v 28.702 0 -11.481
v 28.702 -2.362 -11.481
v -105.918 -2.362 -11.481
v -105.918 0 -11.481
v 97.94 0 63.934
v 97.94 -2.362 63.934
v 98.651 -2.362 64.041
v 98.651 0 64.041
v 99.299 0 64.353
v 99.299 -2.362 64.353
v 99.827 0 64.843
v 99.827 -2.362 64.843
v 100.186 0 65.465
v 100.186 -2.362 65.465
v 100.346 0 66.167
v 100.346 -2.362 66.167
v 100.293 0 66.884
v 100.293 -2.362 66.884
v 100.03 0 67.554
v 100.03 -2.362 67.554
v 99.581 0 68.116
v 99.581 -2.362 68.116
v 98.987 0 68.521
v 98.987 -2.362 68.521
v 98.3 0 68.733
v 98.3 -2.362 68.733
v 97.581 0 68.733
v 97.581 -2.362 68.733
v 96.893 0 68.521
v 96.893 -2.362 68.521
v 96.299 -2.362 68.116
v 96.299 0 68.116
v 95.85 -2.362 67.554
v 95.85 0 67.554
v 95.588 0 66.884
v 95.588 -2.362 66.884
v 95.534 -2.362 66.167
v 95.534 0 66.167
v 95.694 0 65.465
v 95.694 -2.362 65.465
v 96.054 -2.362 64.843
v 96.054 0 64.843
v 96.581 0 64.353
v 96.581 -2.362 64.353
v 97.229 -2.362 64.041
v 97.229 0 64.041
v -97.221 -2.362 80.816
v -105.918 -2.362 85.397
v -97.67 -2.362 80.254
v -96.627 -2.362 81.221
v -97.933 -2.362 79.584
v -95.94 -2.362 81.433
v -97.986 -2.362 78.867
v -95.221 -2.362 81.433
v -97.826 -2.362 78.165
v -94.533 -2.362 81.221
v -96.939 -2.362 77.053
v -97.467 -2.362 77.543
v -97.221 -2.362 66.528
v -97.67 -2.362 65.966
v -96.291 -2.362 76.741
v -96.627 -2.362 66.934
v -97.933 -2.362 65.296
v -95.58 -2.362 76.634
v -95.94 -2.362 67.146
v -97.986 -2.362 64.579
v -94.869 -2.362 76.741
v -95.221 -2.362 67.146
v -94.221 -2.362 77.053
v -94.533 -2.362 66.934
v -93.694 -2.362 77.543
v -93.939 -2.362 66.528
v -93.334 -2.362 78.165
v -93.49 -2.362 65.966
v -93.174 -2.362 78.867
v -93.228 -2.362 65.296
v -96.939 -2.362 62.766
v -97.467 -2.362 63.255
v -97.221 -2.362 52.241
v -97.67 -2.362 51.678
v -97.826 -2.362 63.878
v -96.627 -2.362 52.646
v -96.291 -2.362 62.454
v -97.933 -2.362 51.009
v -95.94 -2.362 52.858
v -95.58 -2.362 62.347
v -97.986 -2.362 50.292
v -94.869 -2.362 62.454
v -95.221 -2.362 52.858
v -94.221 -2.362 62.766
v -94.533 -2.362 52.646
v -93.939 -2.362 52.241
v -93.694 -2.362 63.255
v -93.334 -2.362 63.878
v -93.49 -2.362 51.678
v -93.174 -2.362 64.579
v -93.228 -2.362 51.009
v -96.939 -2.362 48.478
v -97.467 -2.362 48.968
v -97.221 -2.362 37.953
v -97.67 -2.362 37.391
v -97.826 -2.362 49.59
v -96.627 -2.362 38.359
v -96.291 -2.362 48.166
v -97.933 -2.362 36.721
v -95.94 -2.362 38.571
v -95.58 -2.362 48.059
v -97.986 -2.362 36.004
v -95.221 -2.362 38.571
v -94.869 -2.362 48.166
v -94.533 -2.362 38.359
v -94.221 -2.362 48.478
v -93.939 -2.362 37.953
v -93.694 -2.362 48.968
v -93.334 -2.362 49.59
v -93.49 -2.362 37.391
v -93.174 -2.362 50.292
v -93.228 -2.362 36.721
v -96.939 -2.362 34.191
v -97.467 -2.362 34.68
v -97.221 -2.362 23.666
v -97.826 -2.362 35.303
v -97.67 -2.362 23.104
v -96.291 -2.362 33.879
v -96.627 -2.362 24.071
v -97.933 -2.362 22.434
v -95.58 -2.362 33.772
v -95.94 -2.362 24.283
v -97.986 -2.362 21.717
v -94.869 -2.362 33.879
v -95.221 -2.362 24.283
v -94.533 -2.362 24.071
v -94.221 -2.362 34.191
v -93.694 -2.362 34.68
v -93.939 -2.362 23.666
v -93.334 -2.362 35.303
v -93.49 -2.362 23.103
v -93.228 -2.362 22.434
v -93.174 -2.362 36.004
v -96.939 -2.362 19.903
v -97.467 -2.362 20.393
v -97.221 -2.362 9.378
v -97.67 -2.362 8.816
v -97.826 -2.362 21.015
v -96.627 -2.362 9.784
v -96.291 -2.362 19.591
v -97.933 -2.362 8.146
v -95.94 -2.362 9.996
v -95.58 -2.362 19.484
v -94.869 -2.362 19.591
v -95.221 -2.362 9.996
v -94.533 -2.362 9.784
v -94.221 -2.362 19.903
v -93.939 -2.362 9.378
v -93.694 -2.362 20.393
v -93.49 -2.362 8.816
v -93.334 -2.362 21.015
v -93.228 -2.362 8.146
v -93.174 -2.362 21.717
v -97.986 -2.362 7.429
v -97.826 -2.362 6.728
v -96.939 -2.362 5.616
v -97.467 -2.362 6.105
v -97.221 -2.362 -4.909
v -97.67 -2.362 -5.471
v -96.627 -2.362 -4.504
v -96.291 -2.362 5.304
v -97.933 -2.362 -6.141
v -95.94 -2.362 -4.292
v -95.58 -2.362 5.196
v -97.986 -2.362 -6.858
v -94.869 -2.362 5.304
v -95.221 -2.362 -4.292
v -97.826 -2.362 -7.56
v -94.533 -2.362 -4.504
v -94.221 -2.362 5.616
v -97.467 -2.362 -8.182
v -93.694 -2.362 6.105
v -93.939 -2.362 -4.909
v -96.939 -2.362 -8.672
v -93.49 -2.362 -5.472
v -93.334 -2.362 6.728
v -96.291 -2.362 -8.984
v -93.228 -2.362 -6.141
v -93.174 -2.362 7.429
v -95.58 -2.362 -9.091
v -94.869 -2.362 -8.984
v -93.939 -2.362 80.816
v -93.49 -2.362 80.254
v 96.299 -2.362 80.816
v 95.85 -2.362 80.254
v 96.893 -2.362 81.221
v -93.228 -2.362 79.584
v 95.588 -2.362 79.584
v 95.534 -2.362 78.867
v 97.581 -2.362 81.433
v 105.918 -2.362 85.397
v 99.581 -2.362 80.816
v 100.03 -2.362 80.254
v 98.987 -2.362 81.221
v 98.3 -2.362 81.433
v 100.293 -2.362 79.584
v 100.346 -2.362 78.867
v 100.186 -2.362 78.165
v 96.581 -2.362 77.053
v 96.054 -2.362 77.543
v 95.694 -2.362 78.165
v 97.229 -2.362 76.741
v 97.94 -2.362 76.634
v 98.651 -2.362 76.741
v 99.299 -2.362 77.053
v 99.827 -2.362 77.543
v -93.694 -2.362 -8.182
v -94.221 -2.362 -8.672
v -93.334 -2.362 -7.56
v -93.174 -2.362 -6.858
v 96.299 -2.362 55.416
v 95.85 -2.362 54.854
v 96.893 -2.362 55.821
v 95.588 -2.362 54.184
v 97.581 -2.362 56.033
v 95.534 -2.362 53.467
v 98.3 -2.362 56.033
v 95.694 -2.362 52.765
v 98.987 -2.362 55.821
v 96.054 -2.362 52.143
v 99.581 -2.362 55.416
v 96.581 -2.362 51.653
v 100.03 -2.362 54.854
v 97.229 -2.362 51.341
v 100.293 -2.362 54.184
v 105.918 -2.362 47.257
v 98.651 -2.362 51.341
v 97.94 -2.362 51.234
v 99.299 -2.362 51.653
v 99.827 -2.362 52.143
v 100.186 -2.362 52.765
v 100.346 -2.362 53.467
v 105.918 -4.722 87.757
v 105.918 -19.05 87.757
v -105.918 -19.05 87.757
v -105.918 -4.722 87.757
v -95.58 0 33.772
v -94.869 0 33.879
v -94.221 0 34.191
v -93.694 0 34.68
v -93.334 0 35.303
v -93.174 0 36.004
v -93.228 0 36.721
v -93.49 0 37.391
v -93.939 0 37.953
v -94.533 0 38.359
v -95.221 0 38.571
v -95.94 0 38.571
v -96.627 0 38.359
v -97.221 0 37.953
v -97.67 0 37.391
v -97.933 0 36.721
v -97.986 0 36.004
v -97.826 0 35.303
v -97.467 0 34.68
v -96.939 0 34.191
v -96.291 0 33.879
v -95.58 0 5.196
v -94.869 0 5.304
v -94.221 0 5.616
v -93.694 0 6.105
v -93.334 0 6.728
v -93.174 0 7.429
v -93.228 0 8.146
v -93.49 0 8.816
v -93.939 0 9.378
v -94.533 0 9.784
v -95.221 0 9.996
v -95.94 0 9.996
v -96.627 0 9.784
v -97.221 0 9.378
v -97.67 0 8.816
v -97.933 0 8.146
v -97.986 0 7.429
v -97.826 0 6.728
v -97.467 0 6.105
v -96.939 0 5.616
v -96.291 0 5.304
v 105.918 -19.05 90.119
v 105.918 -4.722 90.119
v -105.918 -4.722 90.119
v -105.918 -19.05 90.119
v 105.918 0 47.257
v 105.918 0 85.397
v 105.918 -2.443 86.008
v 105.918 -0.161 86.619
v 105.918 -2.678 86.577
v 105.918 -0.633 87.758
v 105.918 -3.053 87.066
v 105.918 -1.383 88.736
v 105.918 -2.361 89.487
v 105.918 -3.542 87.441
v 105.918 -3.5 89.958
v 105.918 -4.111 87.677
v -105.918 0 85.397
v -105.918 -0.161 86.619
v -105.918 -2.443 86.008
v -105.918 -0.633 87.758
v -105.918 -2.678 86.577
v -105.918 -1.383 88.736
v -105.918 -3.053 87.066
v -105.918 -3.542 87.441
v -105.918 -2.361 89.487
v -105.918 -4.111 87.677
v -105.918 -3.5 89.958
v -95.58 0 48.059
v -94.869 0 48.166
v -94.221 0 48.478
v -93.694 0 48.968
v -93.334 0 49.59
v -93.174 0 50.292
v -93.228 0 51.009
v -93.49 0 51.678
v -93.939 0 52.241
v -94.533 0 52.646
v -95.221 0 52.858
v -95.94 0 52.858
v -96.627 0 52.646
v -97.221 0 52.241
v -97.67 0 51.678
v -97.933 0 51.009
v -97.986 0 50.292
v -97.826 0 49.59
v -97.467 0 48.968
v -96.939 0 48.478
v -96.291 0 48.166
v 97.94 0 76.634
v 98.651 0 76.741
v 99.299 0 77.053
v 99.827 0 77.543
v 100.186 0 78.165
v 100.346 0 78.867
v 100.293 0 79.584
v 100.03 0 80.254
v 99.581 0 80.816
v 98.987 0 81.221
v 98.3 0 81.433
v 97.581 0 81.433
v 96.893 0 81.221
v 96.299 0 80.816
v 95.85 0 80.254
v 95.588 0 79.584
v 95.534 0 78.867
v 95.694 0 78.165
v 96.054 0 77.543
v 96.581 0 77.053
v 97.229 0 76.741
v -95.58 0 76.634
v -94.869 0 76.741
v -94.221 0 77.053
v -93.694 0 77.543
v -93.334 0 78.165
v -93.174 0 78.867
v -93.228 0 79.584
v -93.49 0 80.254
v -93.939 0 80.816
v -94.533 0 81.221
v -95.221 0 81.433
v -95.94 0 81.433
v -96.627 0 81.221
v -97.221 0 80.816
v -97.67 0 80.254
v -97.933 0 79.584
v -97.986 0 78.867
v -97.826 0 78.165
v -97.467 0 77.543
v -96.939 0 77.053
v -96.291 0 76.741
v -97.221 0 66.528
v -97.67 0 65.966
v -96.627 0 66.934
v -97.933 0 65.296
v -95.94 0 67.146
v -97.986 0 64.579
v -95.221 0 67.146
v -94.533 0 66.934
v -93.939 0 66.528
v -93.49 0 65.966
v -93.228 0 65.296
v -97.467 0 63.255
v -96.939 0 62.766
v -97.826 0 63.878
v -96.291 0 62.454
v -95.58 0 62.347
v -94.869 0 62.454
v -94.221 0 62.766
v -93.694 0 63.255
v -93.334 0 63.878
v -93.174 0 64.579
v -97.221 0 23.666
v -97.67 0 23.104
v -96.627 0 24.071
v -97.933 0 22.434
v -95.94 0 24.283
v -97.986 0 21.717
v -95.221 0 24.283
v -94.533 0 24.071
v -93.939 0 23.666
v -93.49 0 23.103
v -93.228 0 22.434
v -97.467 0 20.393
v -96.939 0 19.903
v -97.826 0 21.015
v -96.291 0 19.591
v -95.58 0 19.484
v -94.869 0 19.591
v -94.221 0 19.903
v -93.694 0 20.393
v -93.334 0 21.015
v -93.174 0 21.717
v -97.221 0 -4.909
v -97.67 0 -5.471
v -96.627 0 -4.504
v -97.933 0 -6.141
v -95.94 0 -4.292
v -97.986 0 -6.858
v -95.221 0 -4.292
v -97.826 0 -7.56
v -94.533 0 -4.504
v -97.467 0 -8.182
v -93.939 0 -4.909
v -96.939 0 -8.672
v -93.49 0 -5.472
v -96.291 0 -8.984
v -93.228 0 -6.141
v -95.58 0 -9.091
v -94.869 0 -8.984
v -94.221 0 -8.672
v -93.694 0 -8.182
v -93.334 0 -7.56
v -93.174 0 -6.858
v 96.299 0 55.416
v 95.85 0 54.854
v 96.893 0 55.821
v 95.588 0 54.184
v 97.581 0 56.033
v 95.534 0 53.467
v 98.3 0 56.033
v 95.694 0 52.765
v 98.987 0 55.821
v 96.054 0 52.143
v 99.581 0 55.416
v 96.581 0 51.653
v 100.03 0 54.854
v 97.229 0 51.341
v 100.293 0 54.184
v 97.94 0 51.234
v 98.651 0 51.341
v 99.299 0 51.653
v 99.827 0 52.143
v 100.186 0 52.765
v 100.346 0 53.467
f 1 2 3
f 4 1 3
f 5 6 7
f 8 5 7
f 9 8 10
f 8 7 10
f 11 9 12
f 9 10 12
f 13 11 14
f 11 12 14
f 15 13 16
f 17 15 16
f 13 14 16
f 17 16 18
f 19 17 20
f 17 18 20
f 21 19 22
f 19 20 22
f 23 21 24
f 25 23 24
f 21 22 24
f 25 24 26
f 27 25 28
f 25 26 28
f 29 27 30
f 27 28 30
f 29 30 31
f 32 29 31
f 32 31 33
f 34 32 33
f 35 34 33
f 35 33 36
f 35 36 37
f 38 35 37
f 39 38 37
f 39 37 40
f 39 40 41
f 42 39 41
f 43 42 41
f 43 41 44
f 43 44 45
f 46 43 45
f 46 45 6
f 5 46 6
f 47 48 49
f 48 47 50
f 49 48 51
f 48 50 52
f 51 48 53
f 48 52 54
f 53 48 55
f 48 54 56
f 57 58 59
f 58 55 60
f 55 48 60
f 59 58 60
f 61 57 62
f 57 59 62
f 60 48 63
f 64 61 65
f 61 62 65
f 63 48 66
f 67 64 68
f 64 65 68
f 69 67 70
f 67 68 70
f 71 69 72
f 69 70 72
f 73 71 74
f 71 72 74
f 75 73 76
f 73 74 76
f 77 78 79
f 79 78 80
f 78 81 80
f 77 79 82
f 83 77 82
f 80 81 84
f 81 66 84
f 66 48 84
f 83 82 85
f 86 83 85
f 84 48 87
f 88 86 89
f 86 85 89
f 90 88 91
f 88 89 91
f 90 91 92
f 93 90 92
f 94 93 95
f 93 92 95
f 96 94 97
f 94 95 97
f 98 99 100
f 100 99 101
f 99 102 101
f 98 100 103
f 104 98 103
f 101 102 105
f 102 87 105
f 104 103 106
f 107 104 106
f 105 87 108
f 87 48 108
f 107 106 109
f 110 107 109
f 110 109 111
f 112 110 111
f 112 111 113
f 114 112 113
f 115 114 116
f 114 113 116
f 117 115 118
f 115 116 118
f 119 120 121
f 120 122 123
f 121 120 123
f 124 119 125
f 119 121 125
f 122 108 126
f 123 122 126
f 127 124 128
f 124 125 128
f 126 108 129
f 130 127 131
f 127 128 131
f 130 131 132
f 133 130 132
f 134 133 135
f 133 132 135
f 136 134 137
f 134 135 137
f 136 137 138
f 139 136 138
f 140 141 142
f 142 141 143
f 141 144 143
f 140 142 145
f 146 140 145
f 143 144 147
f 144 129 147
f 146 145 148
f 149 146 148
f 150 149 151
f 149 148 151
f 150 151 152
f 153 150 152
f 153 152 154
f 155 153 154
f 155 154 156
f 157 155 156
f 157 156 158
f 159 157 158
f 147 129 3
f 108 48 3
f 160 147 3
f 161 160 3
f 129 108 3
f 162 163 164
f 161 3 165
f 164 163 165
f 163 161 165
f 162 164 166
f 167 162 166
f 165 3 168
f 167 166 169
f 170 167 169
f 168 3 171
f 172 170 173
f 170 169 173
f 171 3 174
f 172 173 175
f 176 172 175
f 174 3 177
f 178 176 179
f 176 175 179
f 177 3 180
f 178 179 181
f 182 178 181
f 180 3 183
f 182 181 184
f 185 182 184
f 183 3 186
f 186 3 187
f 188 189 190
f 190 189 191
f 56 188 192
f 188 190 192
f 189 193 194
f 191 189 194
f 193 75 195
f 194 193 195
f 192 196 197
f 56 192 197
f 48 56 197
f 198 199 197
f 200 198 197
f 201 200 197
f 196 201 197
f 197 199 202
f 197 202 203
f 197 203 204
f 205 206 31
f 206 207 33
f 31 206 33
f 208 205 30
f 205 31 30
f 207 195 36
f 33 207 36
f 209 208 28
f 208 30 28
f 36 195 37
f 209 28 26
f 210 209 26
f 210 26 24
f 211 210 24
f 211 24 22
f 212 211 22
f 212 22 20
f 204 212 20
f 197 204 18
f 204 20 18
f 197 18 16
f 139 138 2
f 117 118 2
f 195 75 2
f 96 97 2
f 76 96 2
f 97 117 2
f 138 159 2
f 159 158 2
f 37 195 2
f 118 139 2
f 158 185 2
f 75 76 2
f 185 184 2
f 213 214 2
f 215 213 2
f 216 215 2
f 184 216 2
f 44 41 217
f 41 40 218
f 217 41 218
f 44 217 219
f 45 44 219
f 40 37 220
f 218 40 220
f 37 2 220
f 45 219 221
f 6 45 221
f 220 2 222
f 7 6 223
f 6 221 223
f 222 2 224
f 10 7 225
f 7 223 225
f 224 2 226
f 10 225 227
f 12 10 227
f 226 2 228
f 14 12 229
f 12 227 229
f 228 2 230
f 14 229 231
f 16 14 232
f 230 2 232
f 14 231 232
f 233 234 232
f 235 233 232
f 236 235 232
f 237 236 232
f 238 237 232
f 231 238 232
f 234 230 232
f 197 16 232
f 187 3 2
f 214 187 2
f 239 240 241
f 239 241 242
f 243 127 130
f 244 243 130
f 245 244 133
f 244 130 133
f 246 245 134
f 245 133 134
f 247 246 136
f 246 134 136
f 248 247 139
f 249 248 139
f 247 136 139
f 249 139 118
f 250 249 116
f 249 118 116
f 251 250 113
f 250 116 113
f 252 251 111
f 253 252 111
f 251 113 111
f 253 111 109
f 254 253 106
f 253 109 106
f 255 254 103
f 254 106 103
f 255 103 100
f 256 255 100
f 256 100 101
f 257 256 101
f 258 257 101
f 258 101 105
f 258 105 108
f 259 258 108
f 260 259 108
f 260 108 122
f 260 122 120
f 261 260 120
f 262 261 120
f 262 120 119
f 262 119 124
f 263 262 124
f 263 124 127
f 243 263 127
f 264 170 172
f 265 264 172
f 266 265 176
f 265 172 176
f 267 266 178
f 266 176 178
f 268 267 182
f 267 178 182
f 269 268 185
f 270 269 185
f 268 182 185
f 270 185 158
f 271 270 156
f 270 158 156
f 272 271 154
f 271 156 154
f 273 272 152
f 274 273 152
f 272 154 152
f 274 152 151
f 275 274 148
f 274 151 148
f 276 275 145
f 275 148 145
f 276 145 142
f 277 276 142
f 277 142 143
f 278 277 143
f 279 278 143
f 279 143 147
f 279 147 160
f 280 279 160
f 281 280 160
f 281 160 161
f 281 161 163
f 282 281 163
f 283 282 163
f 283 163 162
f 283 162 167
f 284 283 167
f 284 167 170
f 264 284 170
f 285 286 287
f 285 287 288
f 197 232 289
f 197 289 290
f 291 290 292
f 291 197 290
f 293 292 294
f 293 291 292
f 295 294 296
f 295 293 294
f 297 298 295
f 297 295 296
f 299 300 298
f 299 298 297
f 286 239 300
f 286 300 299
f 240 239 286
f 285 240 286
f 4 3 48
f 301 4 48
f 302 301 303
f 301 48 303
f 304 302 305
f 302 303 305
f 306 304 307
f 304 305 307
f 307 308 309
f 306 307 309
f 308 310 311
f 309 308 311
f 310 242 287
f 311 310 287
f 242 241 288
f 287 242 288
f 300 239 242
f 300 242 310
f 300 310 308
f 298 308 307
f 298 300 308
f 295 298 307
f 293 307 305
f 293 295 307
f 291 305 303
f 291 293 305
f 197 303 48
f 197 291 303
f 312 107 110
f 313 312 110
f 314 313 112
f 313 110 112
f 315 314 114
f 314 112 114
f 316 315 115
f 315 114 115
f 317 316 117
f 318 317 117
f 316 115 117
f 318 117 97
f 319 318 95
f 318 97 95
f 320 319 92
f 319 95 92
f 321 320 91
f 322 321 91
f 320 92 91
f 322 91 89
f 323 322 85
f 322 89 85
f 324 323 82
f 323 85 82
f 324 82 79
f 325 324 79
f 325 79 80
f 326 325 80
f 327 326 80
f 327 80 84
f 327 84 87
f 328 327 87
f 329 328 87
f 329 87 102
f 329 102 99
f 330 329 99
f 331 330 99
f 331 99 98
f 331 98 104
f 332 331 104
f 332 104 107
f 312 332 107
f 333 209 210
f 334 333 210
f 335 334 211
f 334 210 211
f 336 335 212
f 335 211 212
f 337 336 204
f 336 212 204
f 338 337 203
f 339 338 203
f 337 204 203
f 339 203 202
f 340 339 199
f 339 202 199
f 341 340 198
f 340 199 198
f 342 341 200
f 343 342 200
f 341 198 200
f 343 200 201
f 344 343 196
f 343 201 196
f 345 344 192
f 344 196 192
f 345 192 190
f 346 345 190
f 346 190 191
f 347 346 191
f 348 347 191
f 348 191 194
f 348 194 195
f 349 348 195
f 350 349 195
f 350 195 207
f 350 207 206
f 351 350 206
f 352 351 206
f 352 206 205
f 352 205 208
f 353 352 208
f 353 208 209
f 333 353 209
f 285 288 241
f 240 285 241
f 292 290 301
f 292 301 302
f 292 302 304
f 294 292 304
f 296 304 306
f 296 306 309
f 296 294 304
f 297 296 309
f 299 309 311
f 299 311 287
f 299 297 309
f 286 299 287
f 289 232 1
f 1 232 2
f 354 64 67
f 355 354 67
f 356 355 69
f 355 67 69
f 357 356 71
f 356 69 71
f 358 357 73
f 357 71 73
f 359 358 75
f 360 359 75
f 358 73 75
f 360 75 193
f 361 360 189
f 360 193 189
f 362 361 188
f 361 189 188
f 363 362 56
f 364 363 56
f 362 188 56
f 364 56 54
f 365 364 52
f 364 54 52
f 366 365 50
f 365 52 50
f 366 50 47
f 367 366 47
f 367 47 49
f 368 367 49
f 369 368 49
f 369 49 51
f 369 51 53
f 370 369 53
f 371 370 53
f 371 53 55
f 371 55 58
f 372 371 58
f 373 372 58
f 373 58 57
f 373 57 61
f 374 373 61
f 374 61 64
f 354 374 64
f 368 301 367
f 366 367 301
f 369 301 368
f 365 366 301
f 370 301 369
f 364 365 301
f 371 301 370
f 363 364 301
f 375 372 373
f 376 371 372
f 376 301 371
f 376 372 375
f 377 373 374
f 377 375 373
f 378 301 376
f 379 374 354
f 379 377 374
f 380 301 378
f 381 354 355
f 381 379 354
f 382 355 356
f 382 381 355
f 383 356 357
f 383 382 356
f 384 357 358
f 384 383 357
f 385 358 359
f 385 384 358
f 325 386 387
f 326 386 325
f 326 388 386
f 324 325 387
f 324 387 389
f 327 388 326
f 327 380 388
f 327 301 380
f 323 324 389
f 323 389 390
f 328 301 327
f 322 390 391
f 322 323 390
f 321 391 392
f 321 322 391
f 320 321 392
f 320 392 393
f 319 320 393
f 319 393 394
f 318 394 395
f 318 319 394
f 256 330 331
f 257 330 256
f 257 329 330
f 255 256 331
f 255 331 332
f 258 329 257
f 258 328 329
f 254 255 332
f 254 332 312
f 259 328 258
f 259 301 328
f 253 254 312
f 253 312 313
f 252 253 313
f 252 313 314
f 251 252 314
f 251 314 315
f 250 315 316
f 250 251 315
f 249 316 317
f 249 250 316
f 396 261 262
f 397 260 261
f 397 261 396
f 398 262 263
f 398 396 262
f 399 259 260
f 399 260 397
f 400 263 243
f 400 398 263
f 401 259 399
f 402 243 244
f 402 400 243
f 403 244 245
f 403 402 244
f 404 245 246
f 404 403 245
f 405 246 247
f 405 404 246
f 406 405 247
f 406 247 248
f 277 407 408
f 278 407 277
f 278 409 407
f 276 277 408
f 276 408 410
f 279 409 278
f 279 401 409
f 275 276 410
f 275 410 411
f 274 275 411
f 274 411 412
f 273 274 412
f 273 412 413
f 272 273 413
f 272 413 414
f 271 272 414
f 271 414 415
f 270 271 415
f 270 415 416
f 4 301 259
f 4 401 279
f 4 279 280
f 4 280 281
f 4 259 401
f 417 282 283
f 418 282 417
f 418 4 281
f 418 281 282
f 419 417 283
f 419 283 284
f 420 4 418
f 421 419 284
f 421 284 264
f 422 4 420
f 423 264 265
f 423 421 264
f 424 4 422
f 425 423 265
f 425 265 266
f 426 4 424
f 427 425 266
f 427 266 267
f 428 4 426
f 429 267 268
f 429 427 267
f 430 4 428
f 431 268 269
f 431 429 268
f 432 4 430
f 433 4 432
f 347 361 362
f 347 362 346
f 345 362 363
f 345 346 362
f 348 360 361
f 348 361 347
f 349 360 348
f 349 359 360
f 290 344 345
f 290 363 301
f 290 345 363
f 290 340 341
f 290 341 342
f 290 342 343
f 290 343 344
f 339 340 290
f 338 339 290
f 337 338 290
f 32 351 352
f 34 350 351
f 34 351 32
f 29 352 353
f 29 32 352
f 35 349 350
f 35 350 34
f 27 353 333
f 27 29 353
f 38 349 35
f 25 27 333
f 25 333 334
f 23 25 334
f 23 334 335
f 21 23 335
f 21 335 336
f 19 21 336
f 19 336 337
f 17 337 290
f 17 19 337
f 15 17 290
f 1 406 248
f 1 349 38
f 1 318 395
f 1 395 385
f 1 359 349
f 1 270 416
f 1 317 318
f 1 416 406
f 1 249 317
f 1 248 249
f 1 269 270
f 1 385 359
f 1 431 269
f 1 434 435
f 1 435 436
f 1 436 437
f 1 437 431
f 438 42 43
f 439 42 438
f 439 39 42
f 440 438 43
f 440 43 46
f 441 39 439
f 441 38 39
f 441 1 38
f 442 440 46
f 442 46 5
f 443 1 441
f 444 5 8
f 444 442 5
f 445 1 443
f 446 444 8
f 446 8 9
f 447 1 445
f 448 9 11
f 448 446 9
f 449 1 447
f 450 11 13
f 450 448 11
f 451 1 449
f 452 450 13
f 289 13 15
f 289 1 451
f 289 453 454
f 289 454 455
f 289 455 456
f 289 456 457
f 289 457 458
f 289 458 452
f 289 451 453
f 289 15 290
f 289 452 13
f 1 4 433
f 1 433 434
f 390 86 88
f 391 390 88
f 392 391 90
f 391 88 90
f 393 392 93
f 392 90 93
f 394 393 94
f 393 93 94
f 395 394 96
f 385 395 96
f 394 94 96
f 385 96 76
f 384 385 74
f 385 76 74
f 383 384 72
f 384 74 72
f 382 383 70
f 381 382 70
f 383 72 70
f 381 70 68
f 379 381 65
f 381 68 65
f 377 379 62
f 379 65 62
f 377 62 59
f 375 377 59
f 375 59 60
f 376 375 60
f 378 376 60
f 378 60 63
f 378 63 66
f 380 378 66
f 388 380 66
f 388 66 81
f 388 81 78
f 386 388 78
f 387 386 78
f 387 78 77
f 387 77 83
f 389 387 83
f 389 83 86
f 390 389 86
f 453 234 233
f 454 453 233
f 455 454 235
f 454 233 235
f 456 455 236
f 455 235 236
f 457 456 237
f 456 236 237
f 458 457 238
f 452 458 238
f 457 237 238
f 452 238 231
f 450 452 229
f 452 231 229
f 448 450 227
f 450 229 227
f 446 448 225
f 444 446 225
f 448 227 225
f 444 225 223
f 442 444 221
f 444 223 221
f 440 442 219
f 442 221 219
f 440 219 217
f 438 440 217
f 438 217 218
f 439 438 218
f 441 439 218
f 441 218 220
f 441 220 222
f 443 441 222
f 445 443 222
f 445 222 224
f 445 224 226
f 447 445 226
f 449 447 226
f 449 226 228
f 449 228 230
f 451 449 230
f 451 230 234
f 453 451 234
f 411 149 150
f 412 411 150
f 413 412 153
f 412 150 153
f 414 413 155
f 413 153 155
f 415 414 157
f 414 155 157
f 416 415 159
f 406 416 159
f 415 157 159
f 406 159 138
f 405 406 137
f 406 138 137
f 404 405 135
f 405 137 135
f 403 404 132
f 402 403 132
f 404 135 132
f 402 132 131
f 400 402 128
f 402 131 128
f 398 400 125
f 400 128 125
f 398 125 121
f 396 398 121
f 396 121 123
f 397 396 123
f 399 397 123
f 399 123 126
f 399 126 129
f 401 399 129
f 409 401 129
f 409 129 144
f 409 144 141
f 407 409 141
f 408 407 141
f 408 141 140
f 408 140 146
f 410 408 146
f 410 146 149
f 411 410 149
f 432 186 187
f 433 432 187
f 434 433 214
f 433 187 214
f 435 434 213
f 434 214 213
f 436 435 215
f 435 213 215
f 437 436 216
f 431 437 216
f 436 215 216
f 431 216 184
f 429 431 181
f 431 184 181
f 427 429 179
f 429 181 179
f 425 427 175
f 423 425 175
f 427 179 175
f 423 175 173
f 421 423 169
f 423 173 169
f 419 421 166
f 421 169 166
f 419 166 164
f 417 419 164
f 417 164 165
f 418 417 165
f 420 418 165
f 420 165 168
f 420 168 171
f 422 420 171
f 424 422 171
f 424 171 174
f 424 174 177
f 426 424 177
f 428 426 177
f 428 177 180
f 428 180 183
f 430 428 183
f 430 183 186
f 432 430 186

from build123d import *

# Parameters (mm, degrees)
SKETCH1_W                    = 211.836
SKETCH1_H                    = 175.514
BASE_FLANGE1_DEPTH           = 2.3622
EDGE_FLANGE4_STRIP_W         = 14.1688
EDGE_FLANGE4_STRIP_H         = 2.3622
EDGE_FLANGE4_STRIP_CUT_DEPTH = 211.836
EDGE_FLANGE4_DEPTH           = 211.836
CUT_EXTRUDE1_DEPTH           = 141.066325723
SKETCH38_R                   = 2.413
CUT_EXTRUDE3_DEPTH           = 141.066325723
SKETCH40_R                   = 2.413
CUT_EXTRUDE4_DEPTH           = 141.066325723


# Sheet-metal steps are written as plain solids
with BuildPart() as part:
    # Sketch1 → Base-Flange1 (new body)
    with BuildSketch(Plane(origin=(0, 0, 0), x_dir=(1, 0, 0), z_dir=(0, 1, 0))):
        Rectangle(SKETCH1_W, SKETCH1_H)
    extrude(amount=-BASE_FLANGE1_DEPTH)

    # Edge-Flange4 strip (across the edge) → Edge-Flange4 strip cut (cut)
    with BuildSketch(Plane(origin=(105.918, -2.3622, 87.757), x_dir=(0, 0, -1), z_dir=(-1, 0, 0))):
        with Locations((-4.7244, -1.1811)):
            Rectangle(EDGE_FLANGE4_STRIP_W, EDGE_FLANGE4_STRIP_H)
    extrude(amount=EDGE_FLANGE4_STRIP_CUT_DEPTH, mode=Mode.SUBTRACT)

    # Edge-Flange4 section (across the edge) → Edge-Flange4 (add)
    with BuildSketch(Plane(origin=(105.918, -2.3622, 87.757), x_dir=(0, 0, -1), z_dir=(-1, 0, 0))):
        with BuildLine():
            Line((-2.3622, 2.36), (-2.3622, 16.6878))
            Line((-2.3622, 16.6878), (0, 16.6878))
            Line((0, 16.6878), (0, 2.36))
            ThreePointArc((0, 2.36), (0.691227996, 0.691227996), (2.36, 0))
            Line((2.36, 0), (2.36, -2.3622))
            ThreePointArc((2.36, -2.3622), (-0.979099642, -0.979099642), (-2.3622, 2.36))
        make_face()
    extrude(amount=EDGE_FLANGE4_DEPTH)

    # Sketch36 → Cut-Extrude1 (cut, through all)
    with BuildSketch(Plane.XZ.offset(2.3622)):
        Polygon((28.702, -11.4808), (-105.918, -11.4808), (-105.918, -87.757), (105.918, -87.757), (105.918, 47.2567), align=None)
    extrude(amount=-CUT_EXTRUDE1_DEPTH, mode=Mode.SUBTRACT)

    # Sketch38 → Cut-Extrude3 (cut, through all)
    with BuildSketch(Plane.XZ.offset(2.3622)):
        with Locations(Location((97.9402, 79.047, 0), (0, 0, 270))):
            Circle(SKETCH38_R)
        with Locations(Location((97.9402, 66.347, 0), (0, 0, 270))):
            Circle(SKETCH38_R)
        with Locations(Location((97.9402, 53.647, 0), (0, 0, 270))):
            Circle(SKETCH38_R)
    extrude(amount=-CUT_EXTRUDE3_DEPTH, mode=Mode.SUBTRACT)

    # Sketch40 → Cut-Extrude4 (cut, through all)
    with BuildSketch(Plane.XZ.offset(2.3622)):
        with Locations(Location((-95.5802, 79.047, 0), (0, 0, 270))):
            Circle(SKETCH40_R)
        with Locations(Location((-95.5802, 64.7595, 0), (0, 0, 270))):
            Circle(SKETCH40_R)
        with Locations(Location((-95.5802, 50.472, 0), (0, 0, 270))):
            Circle(SKETCH40_R)
        with Locations(Location((-95.5802, 36.1845, 0), (0, 0, 270))):
            Circle(SKETCH40_R)
        with Locations(Location((-95.5802, 21.897, 0), (0, 0, 270))):
            Circle(SKETCH40_R)
        with Locations(Location((-95.5802, 7.6095, 0), (0, 0, 270))):
            Circle(SKETCH40_R)
        with Locations(Location((-95.5802, -6.678, 0), (0, 0, 270))):
            Circle(SKETCH40_R)
    extrude(amount=-CUT_EXTRUDE4_DEPTH, mode=Mode.SUBTRACT)


solid = part.part
